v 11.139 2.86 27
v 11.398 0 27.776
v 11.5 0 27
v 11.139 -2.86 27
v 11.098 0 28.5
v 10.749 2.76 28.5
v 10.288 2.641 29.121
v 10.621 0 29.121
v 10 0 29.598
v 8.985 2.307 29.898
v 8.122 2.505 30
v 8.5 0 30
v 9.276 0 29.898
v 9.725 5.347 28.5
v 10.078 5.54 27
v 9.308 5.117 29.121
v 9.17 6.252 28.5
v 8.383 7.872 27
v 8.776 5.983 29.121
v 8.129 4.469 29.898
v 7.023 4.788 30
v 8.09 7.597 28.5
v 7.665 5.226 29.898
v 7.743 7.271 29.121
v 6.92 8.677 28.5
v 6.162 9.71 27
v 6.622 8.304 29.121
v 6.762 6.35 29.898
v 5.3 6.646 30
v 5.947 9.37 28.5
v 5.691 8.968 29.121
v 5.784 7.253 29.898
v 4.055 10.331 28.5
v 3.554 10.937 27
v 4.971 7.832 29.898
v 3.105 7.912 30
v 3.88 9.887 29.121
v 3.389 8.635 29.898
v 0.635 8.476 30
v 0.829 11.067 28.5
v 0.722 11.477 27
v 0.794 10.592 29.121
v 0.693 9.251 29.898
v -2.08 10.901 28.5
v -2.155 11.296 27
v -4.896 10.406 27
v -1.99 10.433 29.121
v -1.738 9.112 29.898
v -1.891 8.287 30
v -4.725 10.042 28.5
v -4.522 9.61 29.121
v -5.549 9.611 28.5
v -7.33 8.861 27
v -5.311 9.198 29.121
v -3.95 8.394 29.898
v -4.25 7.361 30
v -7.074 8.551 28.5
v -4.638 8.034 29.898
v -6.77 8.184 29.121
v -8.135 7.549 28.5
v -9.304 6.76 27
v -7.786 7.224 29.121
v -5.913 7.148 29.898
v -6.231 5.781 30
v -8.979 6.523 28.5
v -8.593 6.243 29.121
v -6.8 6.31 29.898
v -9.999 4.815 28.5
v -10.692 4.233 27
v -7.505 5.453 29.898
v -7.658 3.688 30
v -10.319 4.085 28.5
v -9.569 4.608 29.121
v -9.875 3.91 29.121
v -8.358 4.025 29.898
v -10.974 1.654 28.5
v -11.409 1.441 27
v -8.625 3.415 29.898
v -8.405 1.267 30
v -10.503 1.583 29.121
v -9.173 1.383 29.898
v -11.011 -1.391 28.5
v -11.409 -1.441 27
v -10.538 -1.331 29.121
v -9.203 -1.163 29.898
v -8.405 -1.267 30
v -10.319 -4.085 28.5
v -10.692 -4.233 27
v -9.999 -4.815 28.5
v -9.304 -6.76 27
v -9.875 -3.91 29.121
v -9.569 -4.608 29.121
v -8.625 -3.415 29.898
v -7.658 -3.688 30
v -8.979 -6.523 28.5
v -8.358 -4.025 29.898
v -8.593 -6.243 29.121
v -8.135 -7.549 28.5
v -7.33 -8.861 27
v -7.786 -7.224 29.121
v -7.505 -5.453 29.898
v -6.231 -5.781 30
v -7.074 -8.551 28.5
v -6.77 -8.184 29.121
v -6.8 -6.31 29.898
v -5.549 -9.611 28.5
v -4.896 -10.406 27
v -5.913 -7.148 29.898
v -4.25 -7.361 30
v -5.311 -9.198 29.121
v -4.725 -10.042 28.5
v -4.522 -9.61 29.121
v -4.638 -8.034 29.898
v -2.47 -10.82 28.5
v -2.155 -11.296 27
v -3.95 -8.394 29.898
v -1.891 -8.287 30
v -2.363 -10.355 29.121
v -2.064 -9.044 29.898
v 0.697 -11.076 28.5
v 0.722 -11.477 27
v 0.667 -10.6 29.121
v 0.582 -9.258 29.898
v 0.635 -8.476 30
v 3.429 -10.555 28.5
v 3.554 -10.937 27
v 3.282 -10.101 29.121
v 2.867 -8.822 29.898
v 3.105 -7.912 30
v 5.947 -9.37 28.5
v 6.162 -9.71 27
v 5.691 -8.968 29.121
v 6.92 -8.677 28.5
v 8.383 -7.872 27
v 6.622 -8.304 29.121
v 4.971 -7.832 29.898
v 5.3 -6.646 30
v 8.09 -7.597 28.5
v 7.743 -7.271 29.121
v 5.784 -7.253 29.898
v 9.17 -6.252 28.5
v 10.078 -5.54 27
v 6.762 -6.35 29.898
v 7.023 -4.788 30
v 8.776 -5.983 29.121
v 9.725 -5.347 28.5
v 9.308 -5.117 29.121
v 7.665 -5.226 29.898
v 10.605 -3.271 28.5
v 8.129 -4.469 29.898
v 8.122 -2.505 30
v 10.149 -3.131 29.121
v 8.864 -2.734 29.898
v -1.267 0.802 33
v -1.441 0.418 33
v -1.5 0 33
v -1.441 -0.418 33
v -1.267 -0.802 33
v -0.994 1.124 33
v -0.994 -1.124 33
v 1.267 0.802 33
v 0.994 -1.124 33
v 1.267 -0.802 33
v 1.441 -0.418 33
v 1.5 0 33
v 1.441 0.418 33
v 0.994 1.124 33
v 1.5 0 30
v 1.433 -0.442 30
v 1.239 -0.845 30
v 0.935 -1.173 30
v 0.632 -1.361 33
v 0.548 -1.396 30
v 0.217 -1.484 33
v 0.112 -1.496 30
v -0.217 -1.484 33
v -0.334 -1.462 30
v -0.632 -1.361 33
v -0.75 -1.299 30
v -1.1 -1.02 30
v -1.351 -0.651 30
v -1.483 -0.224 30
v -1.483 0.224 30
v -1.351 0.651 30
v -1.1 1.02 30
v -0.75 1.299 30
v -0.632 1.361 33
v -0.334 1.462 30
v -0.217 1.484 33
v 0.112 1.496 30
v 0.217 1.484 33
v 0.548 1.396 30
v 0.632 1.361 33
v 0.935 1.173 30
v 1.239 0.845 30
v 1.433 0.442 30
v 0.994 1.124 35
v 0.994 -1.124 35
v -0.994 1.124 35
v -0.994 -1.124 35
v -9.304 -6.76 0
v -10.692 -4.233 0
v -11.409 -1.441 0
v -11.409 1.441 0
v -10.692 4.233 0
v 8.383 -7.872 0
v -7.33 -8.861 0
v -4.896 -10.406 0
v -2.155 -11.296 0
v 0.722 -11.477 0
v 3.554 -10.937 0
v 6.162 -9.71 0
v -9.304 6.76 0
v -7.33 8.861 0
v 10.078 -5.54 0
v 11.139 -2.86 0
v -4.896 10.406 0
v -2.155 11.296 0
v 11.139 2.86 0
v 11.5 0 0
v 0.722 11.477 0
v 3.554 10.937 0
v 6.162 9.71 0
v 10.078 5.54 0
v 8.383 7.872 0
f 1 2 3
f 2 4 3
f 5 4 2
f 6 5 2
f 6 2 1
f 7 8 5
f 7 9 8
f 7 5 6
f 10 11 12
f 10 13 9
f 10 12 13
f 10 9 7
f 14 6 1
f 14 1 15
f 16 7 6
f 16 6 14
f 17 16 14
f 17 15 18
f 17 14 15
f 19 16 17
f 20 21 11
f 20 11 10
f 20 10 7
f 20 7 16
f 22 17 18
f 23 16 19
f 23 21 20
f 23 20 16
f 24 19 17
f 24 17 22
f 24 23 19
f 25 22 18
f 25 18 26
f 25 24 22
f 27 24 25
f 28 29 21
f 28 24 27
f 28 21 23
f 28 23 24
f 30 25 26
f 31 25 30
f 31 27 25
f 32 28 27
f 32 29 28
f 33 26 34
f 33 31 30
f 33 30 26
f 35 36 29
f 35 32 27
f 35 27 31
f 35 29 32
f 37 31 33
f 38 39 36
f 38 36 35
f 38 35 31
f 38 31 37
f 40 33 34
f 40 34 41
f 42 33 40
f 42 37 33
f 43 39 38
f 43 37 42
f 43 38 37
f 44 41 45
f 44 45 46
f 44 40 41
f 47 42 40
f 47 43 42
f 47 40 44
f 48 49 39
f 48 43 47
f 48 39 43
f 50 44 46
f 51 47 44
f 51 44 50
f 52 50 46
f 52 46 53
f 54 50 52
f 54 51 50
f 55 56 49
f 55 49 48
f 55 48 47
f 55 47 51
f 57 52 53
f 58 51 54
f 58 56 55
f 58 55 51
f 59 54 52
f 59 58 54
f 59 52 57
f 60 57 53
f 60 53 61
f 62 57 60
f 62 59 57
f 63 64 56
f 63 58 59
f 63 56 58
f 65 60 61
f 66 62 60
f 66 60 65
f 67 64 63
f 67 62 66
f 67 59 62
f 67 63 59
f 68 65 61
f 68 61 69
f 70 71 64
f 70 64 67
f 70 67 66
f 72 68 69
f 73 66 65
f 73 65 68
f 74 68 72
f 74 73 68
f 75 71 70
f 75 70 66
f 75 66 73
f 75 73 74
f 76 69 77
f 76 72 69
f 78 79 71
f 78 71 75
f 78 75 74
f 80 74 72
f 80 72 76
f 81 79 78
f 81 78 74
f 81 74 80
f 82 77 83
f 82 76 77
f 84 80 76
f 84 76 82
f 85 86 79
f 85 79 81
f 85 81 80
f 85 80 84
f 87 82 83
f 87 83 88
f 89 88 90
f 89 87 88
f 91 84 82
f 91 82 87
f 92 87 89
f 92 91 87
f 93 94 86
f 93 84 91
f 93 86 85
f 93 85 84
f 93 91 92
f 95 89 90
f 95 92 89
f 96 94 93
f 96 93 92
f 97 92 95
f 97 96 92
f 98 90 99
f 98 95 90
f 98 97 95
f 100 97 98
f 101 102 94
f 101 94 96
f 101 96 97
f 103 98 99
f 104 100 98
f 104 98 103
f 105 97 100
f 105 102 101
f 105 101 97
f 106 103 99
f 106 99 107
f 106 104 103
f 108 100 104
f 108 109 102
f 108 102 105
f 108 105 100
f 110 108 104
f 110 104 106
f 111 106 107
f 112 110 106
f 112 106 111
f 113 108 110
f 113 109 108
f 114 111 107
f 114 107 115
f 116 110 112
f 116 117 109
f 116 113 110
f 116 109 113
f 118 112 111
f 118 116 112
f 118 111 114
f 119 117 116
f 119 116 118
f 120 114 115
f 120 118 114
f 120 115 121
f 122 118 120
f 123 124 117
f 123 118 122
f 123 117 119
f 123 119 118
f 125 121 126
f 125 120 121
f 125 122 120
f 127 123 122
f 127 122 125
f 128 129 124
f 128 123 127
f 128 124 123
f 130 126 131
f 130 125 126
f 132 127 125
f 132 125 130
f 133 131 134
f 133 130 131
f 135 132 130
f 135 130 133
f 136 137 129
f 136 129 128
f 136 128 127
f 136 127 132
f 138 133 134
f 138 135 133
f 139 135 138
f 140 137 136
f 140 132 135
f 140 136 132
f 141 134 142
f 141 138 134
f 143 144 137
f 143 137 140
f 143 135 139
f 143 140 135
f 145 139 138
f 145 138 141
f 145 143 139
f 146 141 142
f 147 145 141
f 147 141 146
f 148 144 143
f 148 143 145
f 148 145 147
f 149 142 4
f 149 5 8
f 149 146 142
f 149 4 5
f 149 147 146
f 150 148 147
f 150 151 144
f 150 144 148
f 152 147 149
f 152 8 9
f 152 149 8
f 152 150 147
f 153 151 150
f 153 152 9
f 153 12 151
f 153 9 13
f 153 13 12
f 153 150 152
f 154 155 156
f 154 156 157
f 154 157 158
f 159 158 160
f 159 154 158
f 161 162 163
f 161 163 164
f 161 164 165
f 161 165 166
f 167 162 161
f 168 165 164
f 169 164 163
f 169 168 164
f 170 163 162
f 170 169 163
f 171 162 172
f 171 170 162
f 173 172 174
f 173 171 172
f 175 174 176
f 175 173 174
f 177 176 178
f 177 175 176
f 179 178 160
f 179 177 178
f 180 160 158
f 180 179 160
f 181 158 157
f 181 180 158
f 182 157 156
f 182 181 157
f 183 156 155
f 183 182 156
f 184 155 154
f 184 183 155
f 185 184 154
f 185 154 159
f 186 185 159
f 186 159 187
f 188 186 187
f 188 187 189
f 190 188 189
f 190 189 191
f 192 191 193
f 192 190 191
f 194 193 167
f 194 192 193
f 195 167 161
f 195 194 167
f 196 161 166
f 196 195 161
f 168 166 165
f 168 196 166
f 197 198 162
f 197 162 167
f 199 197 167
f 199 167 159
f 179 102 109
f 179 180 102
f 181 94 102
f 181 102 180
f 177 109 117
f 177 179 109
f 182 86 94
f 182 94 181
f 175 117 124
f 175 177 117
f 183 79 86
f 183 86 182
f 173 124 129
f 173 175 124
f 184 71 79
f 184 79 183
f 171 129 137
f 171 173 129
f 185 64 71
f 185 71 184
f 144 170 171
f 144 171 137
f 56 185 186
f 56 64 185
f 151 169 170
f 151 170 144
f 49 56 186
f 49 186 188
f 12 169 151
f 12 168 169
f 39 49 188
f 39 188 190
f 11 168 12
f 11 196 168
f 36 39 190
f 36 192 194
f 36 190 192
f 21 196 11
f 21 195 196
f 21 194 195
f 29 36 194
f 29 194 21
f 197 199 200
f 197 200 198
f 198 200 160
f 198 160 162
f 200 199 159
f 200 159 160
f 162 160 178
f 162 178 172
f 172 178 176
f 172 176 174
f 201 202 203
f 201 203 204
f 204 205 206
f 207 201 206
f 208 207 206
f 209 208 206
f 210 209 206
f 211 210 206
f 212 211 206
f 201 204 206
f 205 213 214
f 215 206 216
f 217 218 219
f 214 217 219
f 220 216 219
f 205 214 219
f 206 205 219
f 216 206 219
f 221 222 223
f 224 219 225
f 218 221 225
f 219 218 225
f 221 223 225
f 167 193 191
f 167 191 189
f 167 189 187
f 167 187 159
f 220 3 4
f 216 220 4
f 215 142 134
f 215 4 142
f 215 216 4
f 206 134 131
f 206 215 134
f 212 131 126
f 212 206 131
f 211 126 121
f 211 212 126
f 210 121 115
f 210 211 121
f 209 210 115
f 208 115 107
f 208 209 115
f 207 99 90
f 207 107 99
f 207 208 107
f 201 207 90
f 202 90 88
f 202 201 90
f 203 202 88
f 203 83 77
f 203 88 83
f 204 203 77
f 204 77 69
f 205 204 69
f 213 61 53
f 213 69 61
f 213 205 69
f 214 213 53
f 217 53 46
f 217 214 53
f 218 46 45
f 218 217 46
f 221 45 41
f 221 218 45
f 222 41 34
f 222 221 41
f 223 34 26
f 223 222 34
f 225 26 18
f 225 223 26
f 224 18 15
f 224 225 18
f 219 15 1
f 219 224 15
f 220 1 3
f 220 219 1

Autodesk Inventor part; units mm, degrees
ref_plane "YZ Plane" through (0, 0, 0) normal (1, 0, 0) x (0, 1, 0)
ref_plane "XZ Plane" through (0, 0, 0) normal (0, 1, 0) x (-1, 0, 0)
ref_plane "XY Plane" through (0, 0, 0) normal (0, 0, 1) x (1, 0, 0)
sketch "Sketch1" plane through (0, 0, 0) normal (0, 0, 1) x (1, 0, 0)
  circle A0 centre (0, 0) radius 11.5
  dimension "d0" = 23
extrude "Extrusion1" add sketch "Sketch1" along normal blind 30
fillet "Fillet1" radius 3 1 edges at (-11.5, 0, 30)
sketch "Sketch2" plane through (0, 0, 30) normal (0, 0, 1) x (1, 0, 0)
  circle A0 centre (0, 0) radius 1.5
  dimension "d4" = 3
extrude "Extrusion2" add sketch "Sketch2" along normal blind 5
sketch "Sketch3" plane through (0, 0, 35) normal (0, 0, 1) x (1, 0, 0)
  circle A0 centre (0, 0) radius 1.5 projected
  line L0 (-0.9939, -1.1235) -> (0.9939, -1.1235)
  line L1 (0.9939, -1.1235) -> (0.9939, 1.1235)
  line L2 (0.9939, 1.1235) -> (-0.9939, 1.1235)
  line L3 (-0.9939, 1.1235) -> (-0.9939, -1.1235)
  line L4 (-0.9939, -1.1235) -> (0.9939, 1.1235) construction
  line L5 (0.9939, -1.1235) -> (-0.9939, 1.1235) construction
extrude "Extrusion3" cut sketch "Sketch3" against normal blind 2 contours A0 L1 | L2 A0 | A0 L0 | L3 A0
properties part number "Lifting Pad Motor Redo"
